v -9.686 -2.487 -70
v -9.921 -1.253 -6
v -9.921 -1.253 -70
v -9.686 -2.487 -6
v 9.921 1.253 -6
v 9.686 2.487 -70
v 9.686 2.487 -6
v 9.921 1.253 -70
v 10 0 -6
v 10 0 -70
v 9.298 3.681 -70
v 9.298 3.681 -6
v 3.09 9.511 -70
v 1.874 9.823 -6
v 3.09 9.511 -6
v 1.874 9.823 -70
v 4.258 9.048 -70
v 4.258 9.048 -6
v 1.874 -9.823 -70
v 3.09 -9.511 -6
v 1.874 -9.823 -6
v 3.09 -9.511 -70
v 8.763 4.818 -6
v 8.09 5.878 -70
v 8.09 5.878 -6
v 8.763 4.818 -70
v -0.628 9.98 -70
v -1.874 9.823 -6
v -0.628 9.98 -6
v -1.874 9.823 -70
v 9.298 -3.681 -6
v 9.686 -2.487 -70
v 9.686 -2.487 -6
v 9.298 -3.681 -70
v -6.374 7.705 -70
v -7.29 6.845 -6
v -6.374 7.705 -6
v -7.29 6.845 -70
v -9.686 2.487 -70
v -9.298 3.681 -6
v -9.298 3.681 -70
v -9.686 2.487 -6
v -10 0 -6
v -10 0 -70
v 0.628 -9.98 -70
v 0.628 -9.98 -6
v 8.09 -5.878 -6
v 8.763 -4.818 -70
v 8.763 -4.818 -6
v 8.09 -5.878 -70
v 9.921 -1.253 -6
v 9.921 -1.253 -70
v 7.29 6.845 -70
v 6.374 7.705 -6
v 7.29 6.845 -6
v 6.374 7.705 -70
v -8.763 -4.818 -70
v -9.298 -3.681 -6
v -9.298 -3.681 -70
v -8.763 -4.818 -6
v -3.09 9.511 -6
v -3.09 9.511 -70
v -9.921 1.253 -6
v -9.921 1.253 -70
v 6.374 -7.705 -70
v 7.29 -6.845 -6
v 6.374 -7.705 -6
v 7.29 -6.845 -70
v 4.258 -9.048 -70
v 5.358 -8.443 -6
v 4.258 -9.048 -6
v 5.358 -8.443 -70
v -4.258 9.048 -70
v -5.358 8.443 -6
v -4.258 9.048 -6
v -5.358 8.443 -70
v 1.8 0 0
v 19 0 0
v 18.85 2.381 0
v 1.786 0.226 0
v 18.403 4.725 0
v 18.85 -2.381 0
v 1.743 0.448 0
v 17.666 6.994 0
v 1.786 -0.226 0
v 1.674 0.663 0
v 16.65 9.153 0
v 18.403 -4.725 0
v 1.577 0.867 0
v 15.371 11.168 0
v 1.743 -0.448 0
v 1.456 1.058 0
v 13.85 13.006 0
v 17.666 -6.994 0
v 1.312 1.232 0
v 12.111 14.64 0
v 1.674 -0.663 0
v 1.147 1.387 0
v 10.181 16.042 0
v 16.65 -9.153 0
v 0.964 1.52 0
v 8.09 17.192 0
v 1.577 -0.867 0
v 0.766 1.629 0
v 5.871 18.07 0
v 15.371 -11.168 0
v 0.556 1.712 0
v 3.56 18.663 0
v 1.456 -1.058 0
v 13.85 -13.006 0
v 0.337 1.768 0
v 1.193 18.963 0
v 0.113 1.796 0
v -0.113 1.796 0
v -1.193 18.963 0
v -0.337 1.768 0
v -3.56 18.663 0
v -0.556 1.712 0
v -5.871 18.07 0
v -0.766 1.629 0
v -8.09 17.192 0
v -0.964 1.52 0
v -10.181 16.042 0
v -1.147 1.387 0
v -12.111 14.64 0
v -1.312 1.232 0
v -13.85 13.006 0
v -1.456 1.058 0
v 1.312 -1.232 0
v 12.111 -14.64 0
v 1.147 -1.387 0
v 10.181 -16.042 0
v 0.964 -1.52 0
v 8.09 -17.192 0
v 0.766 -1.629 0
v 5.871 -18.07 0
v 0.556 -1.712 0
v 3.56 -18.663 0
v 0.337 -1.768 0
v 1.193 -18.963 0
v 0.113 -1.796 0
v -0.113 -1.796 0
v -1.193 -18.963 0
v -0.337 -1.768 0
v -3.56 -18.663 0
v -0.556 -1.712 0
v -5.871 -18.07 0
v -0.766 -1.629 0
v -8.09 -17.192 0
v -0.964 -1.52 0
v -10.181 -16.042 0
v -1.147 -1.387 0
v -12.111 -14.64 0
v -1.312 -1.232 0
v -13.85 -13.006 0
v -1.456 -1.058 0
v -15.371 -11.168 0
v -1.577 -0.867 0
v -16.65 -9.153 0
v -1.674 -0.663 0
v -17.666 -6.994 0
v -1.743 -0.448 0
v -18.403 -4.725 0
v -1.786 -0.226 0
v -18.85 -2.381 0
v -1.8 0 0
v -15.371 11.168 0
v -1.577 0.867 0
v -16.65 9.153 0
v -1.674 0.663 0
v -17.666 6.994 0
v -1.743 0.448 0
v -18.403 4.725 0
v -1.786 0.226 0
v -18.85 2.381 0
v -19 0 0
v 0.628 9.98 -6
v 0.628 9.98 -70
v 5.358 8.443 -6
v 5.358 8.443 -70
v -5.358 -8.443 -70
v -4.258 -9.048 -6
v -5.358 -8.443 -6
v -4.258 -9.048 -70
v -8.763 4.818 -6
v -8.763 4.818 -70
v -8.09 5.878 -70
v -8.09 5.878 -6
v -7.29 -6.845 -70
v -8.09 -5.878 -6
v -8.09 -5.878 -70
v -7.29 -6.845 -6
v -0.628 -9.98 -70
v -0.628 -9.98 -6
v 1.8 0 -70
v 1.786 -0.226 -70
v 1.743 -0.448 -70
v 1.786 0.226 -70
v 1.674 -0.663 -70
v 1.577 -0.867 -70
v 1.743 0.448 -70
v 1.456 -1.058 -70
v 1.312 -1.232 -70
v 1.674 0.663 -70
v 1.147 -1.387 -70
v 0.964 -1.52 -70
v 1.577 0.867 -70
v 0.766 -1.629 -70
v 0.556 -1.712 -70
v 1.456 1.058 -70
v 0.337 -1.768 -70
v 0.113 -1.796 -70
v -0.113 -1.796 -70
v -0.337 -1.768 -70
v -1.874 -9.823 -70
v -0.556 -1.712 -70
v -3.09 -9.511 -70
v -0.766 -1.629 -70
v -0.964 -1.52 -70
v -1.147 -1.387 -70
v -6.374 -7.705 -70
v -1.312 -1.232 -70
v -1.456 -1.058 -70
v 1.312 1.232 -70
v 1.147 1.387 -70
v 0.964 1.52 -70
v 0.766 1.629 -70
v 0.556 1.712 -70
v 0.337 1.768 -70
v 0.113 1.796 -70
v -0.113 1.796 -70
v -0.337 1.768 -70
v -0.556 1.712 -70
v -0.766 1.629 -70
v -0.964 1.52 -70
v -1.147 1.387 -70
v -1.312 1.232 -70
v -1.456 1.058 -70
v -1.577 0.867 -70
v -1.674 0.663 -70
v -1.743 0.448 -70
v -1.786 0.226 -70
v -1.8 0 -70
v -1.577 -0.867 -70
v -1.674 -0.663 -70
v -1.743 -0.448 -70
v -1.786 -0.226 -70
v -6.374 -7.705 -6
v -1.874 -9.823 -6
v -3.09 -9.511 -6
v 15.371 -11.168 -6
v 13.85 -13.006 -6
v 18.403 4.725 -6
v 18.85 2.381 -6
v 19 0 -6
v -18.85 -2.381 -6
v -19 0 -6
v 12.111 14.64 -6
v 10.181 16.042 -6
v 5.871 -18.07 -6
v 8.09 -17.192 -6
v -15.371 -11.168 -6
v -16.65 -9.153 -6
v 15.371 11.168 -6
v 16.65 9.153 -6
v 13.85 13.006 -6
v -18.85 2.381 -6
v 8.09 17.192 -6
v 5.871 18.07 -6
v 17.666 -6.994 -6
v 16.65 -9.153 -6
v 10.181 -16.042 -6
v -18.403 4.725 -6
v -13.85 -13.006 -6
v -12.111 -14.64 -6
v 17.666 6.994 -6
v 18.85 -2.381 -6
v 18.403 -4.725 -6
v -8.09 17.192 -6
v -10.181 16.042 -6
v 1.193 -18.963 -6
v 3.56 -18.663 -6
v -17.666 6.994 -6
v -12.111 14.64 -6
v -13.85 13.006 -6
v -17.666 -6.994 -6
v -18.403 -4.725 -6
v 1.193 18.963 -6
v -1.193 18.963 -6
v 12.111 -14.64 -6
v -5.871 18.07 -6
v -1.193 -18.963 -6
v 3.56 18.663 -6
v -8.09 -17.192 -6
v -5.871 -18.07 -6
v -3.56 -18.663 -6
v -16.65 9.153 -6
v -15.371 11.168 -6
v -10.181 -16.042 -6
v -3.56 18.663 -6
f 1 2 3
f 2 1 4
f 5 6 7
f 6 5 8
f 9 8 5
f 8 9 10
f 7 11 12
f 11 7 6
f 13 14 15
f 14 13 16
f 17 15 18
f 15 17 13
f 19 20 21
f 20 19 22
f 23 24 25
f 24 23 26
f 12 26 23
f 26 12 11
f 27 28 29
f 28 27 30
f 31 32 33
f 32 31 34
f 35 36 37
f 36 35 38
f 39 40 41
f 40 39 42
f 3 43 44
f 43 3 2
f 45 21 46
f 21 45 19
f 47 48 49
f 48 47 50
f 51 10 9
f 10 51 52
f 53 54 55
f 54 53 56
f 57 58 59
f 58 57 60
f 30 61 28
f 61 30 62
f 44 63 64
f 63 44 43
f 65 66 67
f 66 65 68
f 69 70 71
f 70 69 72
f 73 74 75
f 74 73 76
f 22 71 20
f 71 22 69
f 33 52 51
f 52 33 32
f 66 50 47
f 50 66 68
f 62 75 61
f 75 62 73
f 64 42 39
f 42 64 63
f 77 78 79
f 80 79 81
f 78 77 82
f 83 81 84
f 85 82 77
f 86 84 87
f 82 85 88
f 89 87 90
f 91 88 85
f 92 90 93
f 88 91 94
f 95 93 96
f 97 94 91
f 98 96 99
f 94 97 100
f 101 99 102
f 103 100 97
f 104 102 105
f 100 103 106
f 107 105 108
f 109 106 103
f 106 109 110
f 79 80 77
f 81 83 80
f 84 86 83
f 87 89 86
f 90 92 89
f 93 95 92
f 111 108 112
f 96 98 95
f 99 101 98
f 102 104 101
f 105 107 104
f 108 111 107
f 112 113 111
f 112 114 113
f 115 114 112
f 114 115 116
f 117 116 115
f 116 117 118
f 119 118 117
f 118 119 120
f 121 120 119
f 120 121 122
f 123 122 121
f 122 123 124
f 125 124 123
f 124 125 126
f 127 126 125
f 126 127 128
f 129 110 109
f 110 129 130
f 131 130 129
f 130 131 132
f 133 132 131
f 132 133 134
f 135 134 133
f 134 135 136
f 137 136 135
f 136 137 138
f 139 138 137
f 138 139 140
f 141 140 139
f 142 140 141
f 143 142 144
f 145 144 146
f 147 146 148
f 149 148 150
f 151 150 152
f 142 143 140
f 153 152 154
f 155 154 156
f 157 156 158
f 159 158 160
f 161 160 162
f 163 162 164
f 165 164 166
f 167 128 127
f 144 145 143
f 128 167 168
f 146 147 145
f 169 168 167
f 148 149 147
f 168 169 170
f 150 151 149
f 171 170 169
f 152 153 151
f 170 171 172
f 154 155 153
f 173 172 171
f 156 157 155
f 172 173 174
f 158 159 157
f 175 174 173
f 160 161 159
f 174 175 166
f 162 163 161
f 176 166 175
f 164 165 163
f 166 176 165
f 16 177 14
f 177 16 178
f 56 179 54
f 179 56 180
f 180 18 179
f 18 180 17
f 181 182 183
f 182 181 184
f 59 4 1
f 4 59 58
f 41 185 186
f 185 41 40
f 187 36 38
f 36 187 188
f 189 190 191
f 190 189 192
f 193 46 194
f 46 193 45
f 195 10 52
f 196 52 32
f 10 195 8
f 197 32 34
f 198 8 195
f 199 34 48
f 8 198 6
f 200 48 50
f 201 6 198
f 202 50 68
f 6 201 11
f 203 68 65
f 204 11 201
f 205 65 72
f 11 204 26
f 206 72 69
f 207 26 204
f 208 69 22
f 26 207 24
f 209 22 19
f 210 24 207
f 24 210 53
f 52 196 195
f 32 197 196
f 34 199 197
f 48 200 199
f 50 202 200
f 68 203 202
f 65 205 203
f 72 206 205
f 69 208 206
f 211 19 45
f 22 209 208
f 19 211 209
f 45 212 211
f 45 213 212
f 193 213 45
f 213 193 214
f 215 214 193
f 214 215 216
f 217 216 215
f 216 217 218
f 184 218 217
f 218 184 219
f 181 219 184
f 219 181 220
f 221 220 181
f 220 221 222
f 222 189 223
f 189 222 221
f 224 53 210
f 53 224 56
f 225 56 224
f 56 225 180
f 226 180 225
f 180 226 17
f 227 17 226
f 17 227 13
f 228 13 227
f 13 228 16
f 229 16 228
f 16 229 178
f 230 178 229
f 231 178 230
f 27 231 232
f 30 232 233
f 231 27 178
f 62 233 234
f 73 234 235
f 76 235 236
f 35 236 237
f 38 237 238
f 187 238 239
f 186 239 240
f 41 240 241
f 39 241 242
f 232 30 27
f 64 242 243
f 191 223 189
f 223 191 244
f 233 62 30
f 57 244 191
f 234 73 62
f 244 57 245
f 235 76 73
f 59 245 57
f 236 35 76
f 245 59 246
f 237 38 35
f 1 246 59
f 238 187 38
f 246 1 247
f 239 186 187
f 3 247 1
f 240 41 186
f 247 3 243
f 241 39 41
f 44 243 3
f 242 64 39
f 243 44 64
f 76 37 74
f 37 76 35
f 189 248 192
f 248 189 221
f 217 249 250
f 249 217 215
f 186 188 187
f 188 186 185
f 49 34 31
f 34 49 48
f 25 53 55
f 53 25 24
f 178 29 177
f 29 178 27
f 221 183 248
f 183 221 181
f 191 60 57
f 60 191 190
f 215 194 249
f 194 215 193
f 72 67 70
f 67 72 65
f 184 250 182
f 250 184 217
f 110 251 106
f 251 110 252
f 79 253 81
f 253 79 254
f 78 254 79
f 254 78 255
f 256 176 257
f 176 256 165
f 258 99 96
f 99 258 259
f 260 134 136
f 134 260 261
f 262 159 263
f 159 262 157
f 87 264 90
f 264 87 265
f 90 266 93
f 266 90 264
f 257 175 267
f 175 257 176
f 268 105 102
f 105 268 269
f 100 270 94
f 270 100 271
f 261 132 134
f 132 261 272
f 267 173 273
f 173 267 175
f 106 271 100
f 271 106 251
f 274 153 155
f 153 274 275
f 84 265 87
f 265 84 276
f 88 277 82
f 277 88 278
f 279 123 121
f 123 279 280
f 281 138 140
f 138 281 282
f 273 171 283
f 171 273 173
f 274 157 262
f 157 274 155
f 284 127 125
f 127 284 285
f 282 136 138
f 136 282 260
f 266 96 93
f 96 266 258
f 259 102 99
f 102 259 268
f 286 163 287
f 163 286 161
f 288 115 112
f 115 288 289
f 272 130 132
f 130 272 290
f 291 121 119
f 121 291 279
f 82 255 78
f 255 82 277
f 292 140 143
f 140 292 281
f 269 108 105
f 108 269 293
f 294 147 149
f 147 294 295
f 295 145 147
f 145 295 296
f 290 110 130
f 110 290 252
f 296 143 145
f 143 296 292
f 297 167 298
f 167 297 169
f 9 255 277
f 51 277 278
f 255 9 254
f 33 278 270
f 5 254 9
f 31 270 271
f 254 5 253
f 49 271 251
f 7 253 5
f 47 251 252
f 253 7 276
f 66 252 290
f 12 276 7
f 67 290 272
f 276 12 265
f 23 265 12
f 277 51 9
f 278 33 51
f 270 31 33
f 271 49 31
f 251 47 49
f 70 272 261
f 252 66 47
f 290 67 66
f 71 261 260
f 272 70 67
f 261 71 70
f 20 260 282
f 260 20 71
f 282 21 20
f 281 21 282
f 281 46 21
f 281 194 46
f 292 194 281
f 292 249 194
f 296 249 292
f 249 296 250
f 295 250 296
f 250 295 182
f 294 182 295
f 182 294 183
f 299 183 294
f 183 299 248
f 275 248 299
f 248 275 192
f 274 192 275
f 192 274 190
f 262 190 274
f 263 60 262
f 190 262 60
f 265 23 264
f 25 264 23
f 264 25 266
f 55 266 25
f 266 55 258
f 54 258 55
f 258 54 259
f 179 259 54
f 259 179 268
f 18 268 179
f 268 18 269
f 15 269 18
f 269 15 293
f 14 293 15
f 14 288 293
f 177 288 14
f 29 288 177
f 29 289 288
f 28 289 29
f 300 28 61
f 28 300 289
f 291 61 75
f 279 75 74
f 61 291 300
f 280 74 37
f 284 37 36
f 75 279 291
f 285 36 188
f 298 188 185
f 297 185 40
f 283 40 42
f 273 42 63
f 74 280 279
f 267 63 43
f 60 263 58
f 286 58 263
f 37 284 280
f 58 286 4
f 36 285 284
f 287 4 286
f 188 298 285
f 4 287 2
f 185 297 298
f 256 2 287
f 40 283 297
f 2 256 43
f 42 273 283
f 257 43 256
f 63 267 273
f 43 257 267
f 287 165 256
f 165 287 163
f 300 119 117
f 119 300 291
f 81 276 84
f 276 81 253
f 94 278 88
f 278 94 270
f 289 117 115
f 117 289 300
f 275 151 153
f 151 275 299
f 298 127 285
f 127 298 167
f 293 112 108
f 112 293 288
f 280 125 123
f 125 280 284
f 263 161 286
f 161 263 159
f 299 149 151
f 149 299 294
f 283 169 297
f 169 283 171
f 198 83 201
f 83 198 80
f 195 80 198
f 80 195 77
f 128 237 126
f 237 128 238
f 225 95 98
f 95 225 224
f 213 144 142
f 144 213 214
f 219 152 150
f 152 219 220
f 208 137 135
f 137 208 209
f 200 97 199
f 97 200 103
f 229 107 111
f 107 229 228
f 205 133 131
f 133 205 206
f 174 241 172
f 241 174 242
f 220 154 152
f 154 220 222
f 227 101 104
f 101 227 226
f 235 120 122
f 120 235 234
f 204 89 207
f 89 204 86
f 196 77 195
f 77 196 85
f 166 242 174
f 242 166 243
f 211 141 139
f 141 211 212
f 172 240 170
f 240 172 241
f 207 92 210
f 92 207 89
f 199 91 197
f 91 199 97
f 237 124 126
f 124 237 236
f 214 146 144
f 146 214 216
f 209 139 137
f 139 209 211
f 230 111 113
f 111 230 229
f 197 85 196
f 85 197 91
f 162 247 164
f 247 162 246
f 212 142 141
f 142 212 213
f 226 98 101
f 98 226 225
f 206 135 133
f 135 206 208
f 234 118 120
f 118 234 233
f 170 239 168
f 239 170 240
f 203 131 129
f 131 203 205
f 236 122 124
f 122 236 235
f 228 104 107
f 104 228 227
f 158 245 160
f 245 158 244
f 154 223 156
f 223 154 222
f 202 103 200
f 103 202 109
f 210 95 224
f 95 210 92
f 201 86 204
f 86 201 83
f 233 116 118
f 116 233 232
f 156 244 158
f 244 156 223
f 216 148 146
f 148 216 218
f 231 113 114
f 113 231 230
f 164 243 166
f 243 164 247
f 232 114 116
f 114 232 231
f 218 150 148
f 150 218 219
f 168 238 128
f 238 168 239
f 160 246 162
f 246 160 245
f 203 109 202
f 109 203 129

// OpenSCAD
$fn = 50;


difference() {
	union() {
		translate(v = [0, 0, -70.0000000000]) {
			cylinder(h = 70, r = 10.0000000000);
		}
		translate(v = [0, 0, -6.0000000000]) {
			cylinder(h = 6, r = 19.0000000000);
		}
	}
	union() {
		#translate(v = [0, 0, -70]) {
			cylinder(h = 70, r = 1.8000000000);
		}
	}
}
